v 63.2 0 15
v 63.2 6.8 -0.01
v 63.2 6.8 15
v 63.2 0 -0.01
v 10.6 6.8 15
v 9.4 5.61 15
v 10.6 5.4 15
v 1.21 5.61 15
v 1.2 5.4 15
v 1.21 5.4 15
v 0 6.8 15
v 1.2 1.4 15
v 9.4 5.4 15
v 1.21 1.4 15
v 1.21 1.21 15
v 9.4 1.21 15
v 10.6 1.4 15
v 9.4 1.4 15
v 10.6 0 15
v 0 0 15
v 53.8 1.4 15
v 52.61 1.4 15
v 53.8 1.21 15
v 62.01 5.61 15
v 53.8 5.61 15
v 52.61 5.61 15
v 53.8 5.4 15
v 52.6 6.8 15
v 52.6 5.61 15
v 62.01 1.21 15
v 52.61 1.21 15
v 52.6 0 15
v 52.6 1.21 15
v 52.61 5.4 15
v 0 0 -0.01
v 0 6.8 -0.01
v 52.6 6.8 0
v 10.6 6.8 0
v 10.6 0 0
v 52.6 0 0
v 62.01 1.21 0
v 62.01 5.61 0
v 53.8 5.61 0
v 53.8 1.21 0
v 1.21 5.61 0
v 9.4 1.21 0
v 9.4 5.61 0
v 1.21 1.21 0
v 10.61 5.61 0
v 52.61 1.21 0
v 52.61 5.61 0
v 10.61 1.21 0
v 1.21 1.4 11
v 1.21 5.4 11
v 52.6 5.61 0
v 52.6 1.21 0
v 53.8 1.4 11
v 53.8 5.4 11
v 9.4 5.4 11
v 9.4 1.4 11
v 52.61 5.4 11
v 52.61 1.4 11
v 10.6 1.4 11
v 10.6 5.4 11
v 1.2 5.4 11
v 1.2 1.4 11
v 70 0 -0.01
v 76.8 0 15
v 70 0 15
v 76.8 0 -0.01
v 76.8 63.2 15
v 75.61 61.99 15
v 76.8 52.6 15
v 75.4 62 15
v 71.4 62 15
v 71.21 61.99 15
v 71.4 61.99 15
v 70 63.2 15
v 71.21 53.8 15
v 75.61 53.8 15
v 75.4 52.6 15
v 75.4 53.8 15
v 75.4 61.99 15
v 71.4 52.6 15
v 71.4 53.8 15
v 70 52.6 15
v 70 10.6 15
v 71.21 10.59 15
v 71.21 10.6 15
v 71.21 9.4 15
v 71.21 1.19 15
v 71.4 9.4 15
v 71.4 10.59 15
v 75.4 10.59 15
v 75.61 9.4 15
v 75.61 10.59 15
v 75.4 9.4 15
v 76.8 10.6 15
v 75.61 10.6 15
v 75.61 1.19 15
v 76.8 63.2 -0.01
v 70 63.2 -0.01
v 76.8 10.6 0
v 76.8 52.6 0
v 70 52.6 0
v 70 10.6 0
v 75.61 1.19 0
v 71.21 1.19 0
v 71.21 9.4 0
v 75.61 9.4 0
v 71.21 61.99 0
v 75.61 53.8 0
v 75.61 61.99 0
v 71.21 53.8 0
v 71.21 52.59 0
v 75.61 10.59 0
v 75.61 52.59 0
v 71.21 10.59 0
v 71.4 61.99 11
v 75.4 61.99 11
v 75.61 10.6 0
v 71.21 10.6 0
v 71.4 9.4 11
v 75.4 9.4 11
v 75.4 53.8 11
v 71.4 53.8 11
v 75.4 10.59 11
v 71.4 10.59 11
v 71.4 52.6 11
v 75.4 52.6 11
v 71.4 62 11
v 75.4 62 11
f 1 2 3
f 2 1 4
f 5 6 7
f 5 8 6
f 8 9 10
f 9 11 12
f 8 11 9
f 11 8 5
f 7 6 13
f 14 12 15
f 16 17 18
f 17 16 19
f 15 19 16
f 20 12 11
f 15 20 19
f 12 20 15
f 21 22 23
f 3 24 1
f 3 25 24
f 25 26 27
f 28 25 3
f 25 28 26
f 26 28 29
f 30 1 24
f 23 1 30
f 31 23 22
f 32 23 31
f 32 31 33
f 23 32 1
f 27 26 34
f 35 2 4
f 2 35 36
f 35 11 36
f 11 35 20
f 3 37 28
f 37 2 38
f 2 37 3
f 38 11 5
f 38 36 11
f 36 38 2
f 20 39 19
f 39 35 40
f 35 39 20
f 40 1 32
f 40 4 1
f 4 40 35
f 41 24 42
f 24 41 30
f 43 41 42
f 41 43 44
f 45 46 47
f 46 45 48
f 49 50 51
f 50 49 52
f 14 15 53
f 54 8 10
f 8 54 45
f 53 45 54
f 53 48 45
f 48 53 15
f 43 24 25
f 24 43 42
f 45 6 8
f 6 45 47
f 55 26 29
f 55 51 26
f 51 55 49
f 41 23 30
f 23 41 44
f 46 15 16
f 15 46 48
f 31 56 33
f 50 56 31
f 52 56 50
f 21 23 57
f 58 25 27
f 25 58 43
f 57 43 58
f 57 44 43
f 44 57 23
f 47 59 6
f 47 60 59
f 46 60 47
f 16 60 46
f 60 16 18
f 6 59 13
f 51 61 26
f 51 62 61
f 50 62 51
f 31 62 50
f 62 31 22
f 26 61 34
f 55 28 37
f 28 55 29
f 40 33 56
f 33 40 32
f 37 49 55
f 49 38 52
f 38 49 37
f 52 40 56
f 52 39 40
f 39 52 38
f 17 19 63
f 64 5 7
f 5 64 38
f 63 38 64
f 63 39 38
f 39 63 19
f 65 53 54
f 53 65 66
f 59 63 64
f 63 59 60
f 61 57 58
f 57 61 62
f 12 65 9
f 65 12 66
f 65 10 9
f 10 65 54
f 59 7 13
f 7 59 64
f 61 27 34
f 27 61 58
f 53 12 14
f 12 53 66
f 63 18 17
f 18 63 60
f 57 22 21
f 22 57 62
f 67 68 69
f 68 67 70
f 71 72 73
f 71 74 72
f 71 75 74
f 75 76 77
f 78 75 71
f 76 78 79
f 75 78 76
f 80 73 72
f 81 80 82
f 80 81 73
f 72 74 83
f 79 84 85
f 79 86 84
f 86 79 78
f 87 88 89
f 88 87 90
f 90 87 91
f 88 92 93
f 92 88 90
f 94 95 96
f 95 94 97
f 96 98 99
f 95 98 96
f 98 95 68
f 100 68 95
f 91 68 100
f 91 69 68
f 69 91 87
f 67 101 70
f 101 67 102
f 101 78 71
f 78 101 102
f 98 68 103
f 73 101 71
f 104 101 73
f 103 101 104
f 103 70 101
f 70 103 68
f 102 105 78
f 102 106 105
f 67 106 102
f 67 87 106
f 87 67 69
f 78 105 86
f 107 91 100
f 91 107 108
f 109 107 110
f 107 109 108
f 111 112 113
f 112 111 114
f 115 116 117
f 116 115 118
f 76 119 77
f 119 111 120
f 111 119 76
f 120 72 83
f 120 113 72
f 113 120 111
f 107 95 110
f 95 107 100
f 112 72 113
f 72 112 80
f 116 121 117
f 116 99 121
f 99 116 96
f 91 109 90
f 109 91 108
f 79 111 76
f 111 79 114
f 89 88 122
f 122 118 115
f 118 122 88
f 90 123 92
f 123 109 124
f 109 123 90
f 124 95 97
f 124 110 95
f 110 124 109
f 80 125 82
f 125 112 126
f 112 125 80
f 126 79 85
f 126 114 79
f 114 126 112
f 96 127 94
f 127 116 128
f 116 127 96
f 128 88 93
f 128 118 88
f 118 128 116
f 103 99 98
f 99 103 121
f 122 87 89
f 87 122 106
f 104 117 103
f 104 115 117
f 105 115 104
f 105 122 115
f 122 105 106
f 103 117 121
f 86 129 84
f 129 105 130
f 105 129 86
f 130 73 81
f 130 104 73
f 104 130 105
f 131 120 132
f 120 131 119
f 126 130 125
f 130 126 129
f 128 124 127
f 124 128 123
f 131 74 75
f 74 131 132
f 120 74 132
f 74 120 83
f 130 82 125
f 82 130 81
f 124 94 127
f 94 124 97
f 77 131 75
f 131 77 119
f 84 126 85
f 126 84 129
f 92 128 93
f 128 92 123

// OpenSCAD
// file: ../../Base/Boxes.scad
// Fischertechnik Box Foundation
// Pre-designed Boxes

use <Constants.scad>

include <PlacementOptions.scad>

box190Width = 190;
box190Depth = 130;
box130Width = 130;
box130Depth = 95;

// Values are from an original ec3 box
topBottomDifference = 1.5;
outerHeight = 40;
baseThickness = 1.8;
innerHeight = outerHeight - baseThickness;
stackExcess = 5.7;
radius = 3.5;
wallThickness = 1.5;
tolerance = 0.2;

boxWallThickness = wallThickness;
boxBaseThickness = baseThickness;
boxWebWidth = 3.0;

// getBoxWallThickness()
// Gets the wall thickness of a Fischertechnik Box
function getBoxWallThickness() = boxWallThickness;

// getBoxUsageHeight(height = 38.2)
// Gets the usable height of a Fischertechnik box
// height = Outer height of the box from the bottom to the upper edge.
function getBoxUsageHeight(height = outerHeight) = height - baseThickness - stackExcess;

// getBoxInnerHeight()
// Gets the inner height of a Fischertechnik box, including the stack excess
function getBoxInnerHeight() = innerHeight;

// getBoxBaseThickness()
// Gets the thickness of the Fischertechnik box base.
function getBoxBaseThickness() = boxBaseThickness;

// getBoxWebWidth()
// Gets the width of a box web
function getBoxWebWidth() = boxWebWidth;

// getBox190Space()
// Gets the usable inner space of a Box 190 as an x/y-list
function getBox190Space() = [
    box190Width - 2*getBoxWallThickness() - topBottomDifference, 
    box190Depth - 2*getBoxWallThickness() - topBottomDifference ];

// RoundedCornerPlate(width, depth, height, radius)
// Creates a body plate with rounded corners for a box. Used
// also to create the complete box with the hull module.
// width = Width of the plate
// depth = depth of the plate 
// height = thickness of the plate
// radius = radius of the rounded corner
module RoundedCornerPlate(width, depth, height, radius) {
    translate([radius, radius])
    hull() {
        w = width-2*radius;
        d = depth-2*radius;
        cube([w, d, height]);
        cylinder(height, r=radius, $fn=getFragments());
        translate([w, 0])
            cylinder(height, r=radius, $fn=getFragments());
        translate([w, d])
            cylinder(height, r=radius, $fn=getFragments());
        translate([0, d])
            cylinder(height, r=radius, $fn=getFragments());
    }
}

// BoxBase(width, depth)
// Creates an empty stackable Fischertechnik compatible box
// width = Outer width of the box (190, 130, ...)
// depth = Outer depth of the box (130, 95, ...)

module BoxBase(width, depth, height=outerHeight) {    
    thinPlate = 0.01;

    innerHeight = height - baseThickness;    
    
    module Body(tolerance=tolerance) {
        hull() {
            // Bottom with tolerance to fit into the original boxes when stacked
            translate([-wallThickness+tolerance, -wallThickness+tolerance, -baseThickness])
                RoundedCornerPlate(width-topBottomDifference-2*tolerance, depth-topBottomDifference-2*tolerance, thinPlate, radius);
            
            // Top
            translate([-wallThickness-topBottomDifference/2, -wallThickness-topBottomDifference/2, innerHeight-thinPlate])
                RoundedCornerPlate(width, depth, thinPlate, radius);
         }
    }

    module Cutoff() {
        hull() {
            coWidth = width - 2*wallThickness;
            coDepth = depth - 2*wallThickness;
            
            // Bottom
            RoundedCornerPlate(coWidth-topBottomDifference, coDepth-topBottomDifference, thinPlate, radius);

            // Top
            translate([-topBottomDifference/2, -topBottomDifference/2, innerHeight+thinPlate]) 
                RoundedCornerPlate(coWidth, coDepth, thinPlate, radius);
        }
    }
    
    difference() {        
        Body();
        Cutoff();
        stackOffset = innerHeight - stackExcess;
        translate([0, 0, stackOffset + baseThickness])
            Body(tolerance=0);
    }
}

// Creates the Fischertechnik empty box 130x190 mm and places it at position 0,0
// 190x130 are the outer sizes, the inner space is slightly smaller. Use getBox190Space() to get the inner sizes.
// The box is positioned that the usable inner space is at the 0,0,0 position.

module Box190() {
    BoxBase(box190Width, box190Depth);
}

// Gets the usable inner space of a Box 130 as an x/y-list
function getBox130Space() = [
    box130Width - 2*getBoxWallThickness() - topBottomDifference, 
    box130Depth - 2*getBoxWallThickness() - topBottomDifference ];

// Creates the Fischertechnik empty box 95x130 mm and places it at position 0,0
// 190x130 are the outer sizes, the inner space is slightly smaller. Use getBox190Space() to get the inner sizes.
// The box is positioned that the usable inner space is at the 0,0,0 position.

module Box130() {
    BoxBase(box130Width, box130Depth);
}

// Creates a web at the specified box walls
// corner 0 = LowerLeft, 1 = UpperLeft, 2 = UpperRight, 3 = LowerRight
// side 0 = LeftOfCorner, 1 = RightOfCorner
// distance = Distance in mm from the corner
// boxSpace = inner width and depth of the box (default: Box 190)
// webWidth = length of the web (default is 3 mms)
// webThickness = thickness of the web (default is 1 mm)
// height = Height of the web (standard is getBoxUsageHeight())
// sink = How much of the web is sunk into the wall

module BoxWeb(
    corner, 
    side, 
    distance, 
    boxSpace=getBox190Space(), 
    webWidth=getBoxWebWidth(), 
    webThickness=1.0, 
    height=getBoxUsageHeight(),
    sink = getBoxWallThickness()/2) {
    width = (corner % 2 == 0) ? 
            (side == LeftOfCorner ? webWidth : webThickness) :
            (side == LeftOfCorner ? webThickness : webWidth);

    depth = (corner % 2 == 0) ? 
            (side == RightOfCorner ? webWidth : webThickness) :
            (side == RightOfCorner ? webThickness : webWidth);
    
    xDiff = corner == LowerLeft ? 
                (side == LeftOfCorner ? -sink : distance) :
            (corner == UpperLeft ?                
                (side == LeftOfCorner ? distance : -sink) :
            (corner == UpperRight ?
                (side == LeftOfCorner ? boxSpace.x-webWidth+sink : boxSpace.x-distance-webThickness) :
                (side == LeftOfCorner ? boxSpace.x-distance-webThickness: boxSpace.x-webWidth+sink)));

    yDiff = corner == LowerLeft ? 
                (side == RightOfCorner ? -sink : distance) :
            (corner == UpperLeft ?
                (side == RightOfCorner ? boxSpace.y-distance-webThickness : boxSpace.y-webWidth+sink) :
            (corner == UpperRight ?
                (side == RightOfCorner ? boxSpace.y-webWidth+sink : boxSpace.y-distance-webThickness) :
                (side == RightOfCorner ? distance : -sink)));
    
    translate([xDiff, yDiff, -getExcess()])
        cube([width, depth, height + 2*getExcess()]);
}
// file: ../../Base/Rotation.scad
// Fischertechnik Box Foundation
// Geometry Helpers Rotation

include <PlacementOptions.scad>

// getRotatedSpace(space, rotation=NoRotation)
// Rotates the space dependent on the specified rotation

function getRotatedSpace(space, rotation=NoRotation) = [
    (rotation == Rotate90 || rotation == Rotate270) ? space.y : space.x,
    (rotation == Rotate90 || rotation == Rotate270) ? space.x : space.y
];

// Rotates the given space around the fixed left lower corner
// space = the space the children needs as width/depth list [width,depth]
// rotation = 0 Rotate0 degrees, 1 Rotate90 degrees, 2 Rotate180 degrees, 3 Rotate270 degrees (equivalent to -90)

module RotateFix(space, rotation=NoRotation) {
    dy = (rotation == Rotate0 || rotation == Rotate270) ? 0 :
        (rotation == Rotate90) ? space.x :
        space.y;
    dx = (rotation < Rotate180) ? 0 :
        (rotation == Rotate180) ? space.x :
        space.y;
    
    translate([dx, dy, 0])
        rotate([0, 0, rotations[rotation]])
            children();
}
// file: ../../Base/Alignment.scad
// Fischertechnik Box Foundation
// Geometry Helpers Alignment

include <PlacementOptions.scad>

// getAlignedX(elementWidth, spaceWidth, align=AlignRight, offset=0)
// Gets the aligned X offset of an element with the given
// width in the given space.
// elementWidth = The width of the element to positon
// spaceWidth = The space where the element should be aligned
// align = 0 AlignLeft, 1 AlignCenter, 2 AlignRight
// offset = an optional offset from the aligned position. When
// aligned left or centered, then positive values are in X direction.
// When aligned right then positive values are in negative X direction.

function getAlignedX(elementWidth, spaceWidth, align=AlignRight, offset=0) =
    (align == AlignLeft) ?
        offset :
        ((align == AlignCenter) ?
        (spaceWidth - elementWidth)/2 + offset :
        spaceWidth - offset - elementWidth);

// getAlignedY(elementDepth, spaceDepth, align=AlignTop, offset=0)
// Gets the aligned Y offset of an element with the given
// depth in the given space.
// elementDepth = The depth of the element to positon
// spaceDepth = The space where the element should be aligned
// align = 0 AlignBottom, 1 AlignCenter, 2 AlignTop
// offset = an optional offset from the aligned position. When
// aligned bottom or centered, then positive values are in Y direction.
// When aligned top then positive values are in negative Y direction.

function getAlignedY(elementDepth, spaceDepth, align=AlignTop, offset=0) =
    (align == AlignBottom) ?
        offset :
        ((align == AlignCenter) ?
        (spaceDepth - elementDepth)/2 + offset :
        spaceDepth - offset - elementDepth);
// file: ../../Base/Constants.scad
// Fischertechnik Box Foundation
// Constants

// Constant values necessary for multiple elements

// Base constants
dividerThickness = 1.2;
excess = 0.01;
fragments = 90;
tolerance = 0.8;

// Gets the thickness of a divider 
function getDividerThickness() = dividerThickness;

// Gets the excess that is used to merge walls into each other
function getExcess() = excess;

// Gets amount of fragments of a cylinder
function getFragments() = fragments;

// Gets the inner tolerance of a frame to each side
function getTolerance() = tolerance;


// Fischertechnik specific constants
axisDiameter = 4;
axisBottomDiameter = axisDiameter + 1;
axisTolerance = 0.2;
axisLockingLength = 8;

// Gets axis diameter of Fischertechnik axis
function getAxisDiameter() = axisDiameter;

// Gets axis diameter tolerance (subtracted for element axis)
function getAxisTolerance() = axisTolerance;

// Gets the axis diameter for standing axis
function getStandAxisDiameter() = getAxisDiameter() - getAxisTolerance();

// Gets axis bottom diameter for thicker part at the bottom
function getAxisBottomDiameter() = axisBottomDiameter;

// Gets the lengthh of the locking part of a locking axis
function getAxisLockingLength() = axisLockingLength;

// Studs

studHeight = 2.5;
studTolerance = 0.2;
studRailDistance = 9;   // as in ft 50

// gets the height of a connecting stud
function getStudHeight() = studHeight;

// gets the connecting stud height tolerance
function getStudTolerance() = studTolerance;

// gets the default rail distance for studs
function getStudRailDistance() = studRailDistance;

// Dockable Frame with Edge

standardEdgeDistance = 2.5;
standardWebDistance = 11.5;
standardCornerLength = 15;

// gets the standard distance to the wall of the box for dockable frames with webs
function getStandardEdgeDistance() = standardEdgeDistance;

// gets the standard distance of each web to the corner of the dockable frame
function getStandardWebDistance() = standardWebDistance;

// gets the standard length of the corner walls of a dockable frame
function getStandardCornerLength() = standardCornerLength;

// Tubes

tubeWallFactor = 0.8;

// gets the wall thickness of a tube.
function getTubeWallThickness() = tubeWallFactor * getDividerThickness();

// Small Parts and Divider Frame

smallPartsFrameHeight = 20;

// gets the frame height for docked small parts boxes.
function getSmallPartsFrameHeight() = smallPartsFrameHeight;

// Hubs

hubRingDiameter = 19.5;
hubRingLevelDiameter = 21;

// gets the diameter of a tube matching the inner ring of a wheel
function getHubRingDiameter() = hubRingDiameter;

// gets the diameter of a hub tube with a thicker diameter
function getHubRingLevelDiameter() = hubRingLevelDiameter;

// Struts

strutAddLength = 9.0;
strutDepth = 8.0;

// gets the full length of a strut
function getFullStrutLength(length) = length + strutAddLength;

// gets the radius of the end of a strut
function getStrutEndRadius() = strutAddLength / 2;

// gets the the depth of a strut
function getStrutDepth() = strutDepth;

// Propeller

propellerAxisDiameter = 7.0;
propellerAxisTolerance = 0.2;

// gets the propeller axis outer diameter
function getPropellerAxisDiameter() = propellerAxisDiameter;

// gets the propeller axis printing tolerance
function getPropellerAxisTolerance() = propellerAxisTolerance;
// file: ../../Base/PlacementOptions.scad
// Fischertechnik Box Foundation
// Placement Options

// Alignment
NoAlign = 0;
AlignLeft = 1;
AlignBottom = 2;
AlignCenter = 3;
AlignRight = 4;
AlignTop = 5;

// Element rotation degree steps
rotations = [0, -90, -180, -270];

// Rotation
NoRotation = 0;
Rotate0 = 0;
Rotate90 = 1;
Rotate180 = 2;
Rotate270 = 3;

// Docking (seen from above)
NoDock = -1;
DockLeft = 0;
DockTop = 1;
DockRight = 2;
DockCorner = 2;
DockBottom = 3;

// Web corners
LowerLeft = 0;
UpperLeft = 1;
UpperRight = 2;
LowerRight = 3;

// Web position relative to corner
LeftOfCorner = 0;
RightOfCorner = 1;

// Rails direction
Horizontal = true;
Vertical = false;
// file: ../../Elements/FrameAxis60.scad
// Fischertechnik Box Library
// Frame for single 60 mm Axis
// 31032, 35065

use <../ModelBase/Complex.scad>

/* [Element Parameters] */
count = 1;

/* [Hidden] */
length = 60;

// getFrameAxis60Space(count=1)
// Gets the width (.x) and depth (.y) of the axis frame.
// count = Count of axis

function getFrameAxis60Space(count=1) = getFrameAxisSpace(length, count);

// FrameAxis60(count=1)
// Axis holder for a single 60 mm axis.
// count = Count of axis

module FrameAxis60(count=1) {
    FrameAxis(length, count);
}

// Test
color("lightgray")
FrameAxis60(count);
// file: ../../Base/Placement.scad
// Fischertechnik Box Foundation
// Geometry Helpers Placement

use <Constants.scad>
use <Alignment.scad>
use <Rotation.scad>
use <Boxes.scad>

include <PlacementOptions.scad>

// Place(x=0, y=0, elementSpace=[0,0], alignX=AlignLeft, alignY=AlignBottom, rotation=Rotate0, boxSpace=getBox190Space())
// Places the child at the specified position
// y = Y-Position. This is a relative position when an X aligment is specified.
// x = X-Position. This is a relative position when an Y aligment is specified.
// elementSpace = space of the element to be placed [x,y]
// alignX = -1=NoAlign, 0 AlignLeft, 1 AlignCenter, 3 AlignRight (elementSpace and boxSpace required!)
// alignY = -1=NoAlign, 2 AlignBottom, 1 AlignCenter, 4 AlignTop (elementSpace and boxSpace required!)
// rotation = 0 Rotate0 0 degrees, 1 Rotate90 90 degrees, 
// 2 Rotate180 180 degrees, 3 Rotate270 270 degrees (equivalent to -90)
// boxSpace = Inner space of the box where the placement occurs [x,y] - default is Box 190x130 inner space

module Place(x=0, y=0, elementSpace=[0,0], 
  alignX=AlignLeft, alignY=AlignBottom, 
  rotation=NoRotation, boxSpace=getBox190Space()) {

    module Position(x, y, space, rotation=Rotate0) {
        translate([x, y, 0])
            RotateFix(space, rotation)
                children();
    }

    space = getRotatedSpace(elementSpace, rotation);
    alignedX = getAlignedX(space.x, boxSpace.x, alignX, x);
    alignedY = getAlignedY(space.y, boxSpace.y, alignY, y);
    Position(alignedX, alignedY, elementSpace, rotation)
        children();
}

// Center(space=getBox130Space(), elementSpace=[0,0])
// space = Space where the children is centered. For cylinder use centered=true and no elementSpace.
// elementSpace = space of the element to be centered [x,y]

module Center(space=getBox190Space(), elementSpace=[0,0]) {
    Place(elementSpace=elementSpace, boxSpace=space, alignX=AlignCenter, alignY=AlignCenter)
        children();
}

// CenterHorizontal(width=0, y=0, offset=0, space=getBox130Space())
// width = Width of the element to be placed.
// y = Y position of the element
// offset = Offset from the center position (negative will be left of the center)
// space = Space where the element is placed

module CenterHorizontal(width=0, y=0, offset=0, space=getBox190Space()) {
    Place(x=offset, y=y, elementSpace=[width, 0], boxSpace=space, alignX=AlignCenter)
        children(0);
}

// CenterVertical(depth=0, x=0, offset=0, space=getBox130Space())
// depth = Depth of the element to be placed.
// x = X position of the element
// offset = Offset from the center position (negative will be down of the center)
// space = Space where the element is placed

module CenterVertical(depth=0, x=0, offset=0, space=getBox190Space()) {
    Place(x=x, y=offset, elementSpace=[0, depth], boxSpace=space, alignY=AlignCenter)
        children(0);
}

// getIsVertical(align)
// True if the specified alignment needs a vertical orientation for a divider (AlignRight, AlignLeft)

function getIsVertical(align) = (align == AlignRight || align == AlignLeft);

// getIsHorizontal(align)
// True if the specified alignment needs a horizontal orientation for a divider (AlignTop, AlignBottom)

function getIsHorizontal(align) = (align == AlignTop || align == AlignBottom);
// main file
// Fischertechnik Box Foundation
// Elements
// Test FrameAxis60

use <../../Base/Placement.scad>
use <../../Elements/FrameAxis60.scad>

include <../../Base/PlacementOptions.scad>

count=1;

FrameAxis60(count);

Place(70, 0, elementSpace=getFrameAxis60Space(count), rotation=Rotate90)
    FrameAxis60(count);
